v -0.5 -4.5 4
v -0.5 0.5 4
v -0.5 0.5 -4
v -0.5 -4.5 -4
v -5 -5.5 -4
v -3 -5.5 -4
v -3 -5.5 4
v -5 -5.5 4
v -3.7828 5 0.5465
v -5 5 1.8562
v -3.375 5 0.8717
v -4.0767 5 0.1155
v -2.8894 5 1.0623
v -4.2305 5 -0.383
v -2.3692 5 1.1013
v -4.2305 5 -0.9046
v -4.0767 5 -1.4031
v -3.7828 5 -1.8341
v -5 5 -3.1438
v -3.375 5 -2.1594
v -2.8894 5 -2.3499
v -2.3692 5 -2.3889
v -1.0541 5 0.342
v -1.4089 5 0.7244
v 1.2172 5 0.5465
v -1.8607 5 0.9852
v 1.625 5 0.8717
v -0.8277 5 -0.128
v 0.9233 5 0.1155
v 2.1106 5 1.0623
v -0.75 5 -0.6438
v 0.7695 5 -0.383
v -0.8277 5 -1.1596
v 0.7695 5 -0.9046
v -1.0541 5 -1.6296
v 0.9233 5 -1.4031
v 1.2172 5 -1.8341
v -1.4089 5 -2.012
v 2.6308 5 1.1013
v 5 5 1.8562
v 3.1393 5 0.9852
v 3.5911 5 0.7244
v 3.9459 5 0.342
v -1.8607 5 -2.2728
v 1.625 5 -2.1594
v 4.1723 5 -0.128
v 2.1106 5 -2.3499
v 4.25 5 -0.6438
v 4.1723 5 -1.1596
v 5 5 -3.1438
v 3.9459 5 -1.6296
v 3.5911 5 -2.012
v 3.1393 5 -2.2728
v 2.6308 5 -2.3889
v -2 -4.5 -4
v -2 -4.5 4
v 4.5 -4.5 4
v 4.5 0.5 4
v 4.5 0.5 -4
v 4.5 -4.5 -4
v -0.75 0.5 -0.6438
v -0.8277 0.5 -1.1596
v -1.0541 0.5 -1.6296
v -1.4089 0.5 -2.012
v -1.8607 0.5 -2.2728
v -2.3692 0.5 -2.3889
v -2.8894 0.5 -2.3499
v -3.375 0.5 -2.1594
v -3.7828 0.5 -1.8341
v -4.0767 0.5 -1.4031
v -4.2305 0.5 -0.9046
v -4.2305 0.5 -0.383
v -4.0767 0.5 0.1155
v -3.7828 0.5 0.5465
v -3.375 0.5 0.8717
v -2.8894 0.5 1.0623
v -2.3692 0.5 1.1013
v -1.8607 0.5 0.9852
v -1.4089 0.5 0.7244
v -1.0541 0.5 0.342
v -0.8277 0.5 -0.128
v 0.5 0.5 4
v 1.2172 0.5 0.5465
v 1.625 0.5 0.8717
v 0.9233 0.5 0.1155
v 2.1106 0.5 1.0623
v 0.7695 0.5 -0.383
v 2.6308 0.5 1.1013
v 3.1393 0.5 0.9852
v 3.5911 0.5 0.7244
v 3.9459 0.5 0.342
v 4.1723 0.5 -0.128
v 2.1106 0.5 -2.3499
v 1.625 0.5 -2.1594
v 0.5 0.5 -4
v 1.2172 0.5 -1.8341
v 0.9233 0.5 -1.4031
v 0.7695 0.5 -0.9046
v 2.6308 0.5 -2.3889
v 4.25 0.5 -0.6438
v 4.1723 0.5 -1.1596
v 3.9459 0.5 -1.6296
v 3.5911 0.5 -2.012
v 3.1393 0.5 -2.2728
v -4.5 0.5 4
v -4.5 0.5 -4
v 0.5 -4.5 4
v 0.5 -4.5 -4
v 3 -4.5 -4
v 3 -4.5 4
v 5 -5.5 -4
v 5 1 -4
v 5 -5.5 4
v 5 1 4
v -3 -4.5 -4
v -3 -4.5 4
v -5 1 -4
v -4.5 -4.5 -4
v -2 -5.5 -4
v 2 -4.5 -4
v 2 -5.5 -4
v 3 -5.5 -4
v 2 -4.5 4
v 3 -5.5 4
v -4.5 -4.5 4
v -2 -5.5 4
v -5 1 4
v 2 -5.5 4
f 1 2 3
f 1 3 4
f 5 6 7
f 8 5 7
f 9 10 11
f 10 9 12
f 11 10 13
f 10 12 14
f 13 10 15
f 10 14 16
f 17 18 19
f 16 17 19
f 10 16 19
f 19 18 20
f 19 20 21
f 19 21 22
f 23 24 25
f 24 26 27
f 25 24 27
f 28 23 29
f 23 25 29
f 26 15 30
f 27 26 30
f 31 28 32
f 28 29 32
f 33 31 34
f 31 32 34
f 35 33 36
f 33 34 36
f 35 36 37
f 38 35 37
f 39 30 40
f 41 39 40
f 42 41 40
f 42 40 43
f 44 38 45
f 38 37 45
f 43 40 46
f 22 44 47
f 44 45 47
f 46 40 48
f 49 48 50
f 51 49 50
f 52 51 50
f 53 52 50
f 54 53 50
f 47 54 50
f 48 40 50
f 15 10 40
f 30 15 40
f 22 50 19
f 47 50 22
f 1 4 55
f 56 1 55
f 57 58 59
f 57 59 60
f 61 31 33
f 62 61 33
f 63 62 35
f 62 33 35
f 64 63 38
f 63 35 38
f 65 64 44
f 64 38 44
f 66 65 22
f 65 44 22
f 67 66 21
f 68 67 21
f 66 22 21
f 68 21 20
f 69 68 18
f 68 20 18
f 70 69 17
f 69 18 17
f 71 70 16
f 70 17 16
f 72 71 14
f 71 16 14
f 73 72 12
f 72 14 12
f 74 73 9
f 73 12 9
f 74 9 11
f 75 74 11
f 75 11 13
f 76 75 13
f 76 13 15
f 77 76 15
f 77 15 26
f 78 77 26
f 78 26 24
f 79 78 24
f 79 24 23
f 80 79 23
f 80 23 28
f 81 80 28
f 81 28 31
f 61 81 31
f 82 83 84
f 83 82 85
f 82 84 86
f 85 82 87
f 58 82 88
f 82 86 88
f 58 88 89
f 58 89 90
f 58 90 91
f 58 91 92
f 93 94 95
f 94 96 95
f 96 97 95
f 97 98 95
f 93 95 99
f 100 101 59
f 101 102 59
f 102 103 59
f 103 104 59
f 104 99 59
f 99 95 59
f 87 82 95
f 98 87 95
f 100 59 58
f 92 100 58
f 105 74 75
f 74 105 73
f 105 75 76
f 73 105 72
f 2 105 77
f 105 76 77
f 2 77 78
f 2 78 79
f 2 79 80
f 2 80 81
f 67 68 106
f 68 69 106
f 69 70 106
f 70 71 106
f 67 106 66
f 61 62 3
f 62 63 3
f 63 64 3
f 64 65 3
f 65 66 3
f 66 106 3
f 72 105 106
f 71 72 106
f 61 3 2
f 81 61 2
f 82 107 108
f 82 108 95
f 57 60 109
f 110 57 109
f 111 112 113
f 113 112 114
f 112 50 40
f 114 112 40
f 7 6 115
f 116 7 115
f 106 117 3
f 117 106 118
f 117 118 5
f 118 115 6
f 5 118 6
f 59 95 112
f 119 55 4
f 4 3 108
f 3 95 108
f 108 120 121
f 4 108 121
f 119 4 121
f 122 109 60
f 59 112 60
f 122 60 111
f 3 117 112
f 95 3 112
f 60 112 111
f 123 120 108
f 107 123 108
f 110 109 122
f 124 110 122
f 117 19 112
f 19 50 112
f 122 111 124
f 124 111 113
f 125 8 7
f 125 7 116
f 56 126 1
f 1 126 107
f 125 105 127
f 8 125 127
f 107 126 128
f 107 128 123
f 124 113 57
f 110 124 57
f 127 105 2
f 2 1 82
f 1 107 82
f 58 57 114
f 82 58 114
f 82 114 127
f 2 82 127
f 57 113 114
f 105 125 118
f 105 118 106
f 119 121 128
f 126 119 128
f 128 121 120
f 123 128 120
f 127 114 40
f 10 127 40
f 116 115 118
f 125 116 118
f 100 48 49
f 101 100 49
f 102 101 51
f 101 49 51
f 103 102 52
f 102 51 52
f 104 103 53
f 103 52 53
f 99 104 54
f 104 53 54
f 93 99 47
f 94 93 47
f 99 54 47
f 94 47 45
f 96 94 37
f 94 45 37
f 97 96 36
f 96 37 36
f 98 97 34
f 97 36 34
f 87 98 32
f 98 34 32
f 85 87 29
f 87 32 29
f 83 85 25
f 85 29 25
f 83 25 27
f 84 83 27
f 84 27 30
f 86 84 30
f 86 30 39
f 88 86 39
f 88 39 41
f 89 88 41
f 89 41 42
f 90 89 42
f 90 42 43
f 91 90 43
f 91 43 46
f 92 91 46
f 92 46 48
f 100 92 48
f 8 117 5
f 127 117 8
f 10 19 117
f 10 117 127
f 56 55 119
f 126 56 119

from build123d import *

# Parameters (mm, degrees)
Y_KSEKLIK_EKSTR_ZYON1_DEPTH      = 5
Y_KSEKLIK_EKSTR_ZYON1_DEPTH_BACK = 5
KES_EKSTR_ZYON1_DEPTH            = 10
IZIM3_R                          = 1.75
KES_EKSTR_ZYON2_DEPTH            = 7


with BuildPart() as part:
    # izim1 → Y_kseklik-Ekstr_zyon1 (new body, two sides)
    with BuildSketch(Plane(origin=(0, 0, 0), x_dir=(0, 0, -1), z_dir=(1, 0, 0))) as y_kseklik_ekstr_zyon1_sk:
        Polygon((-1.856187291, 5), (3.143812709, 5), (4, 1), (4, -5.5), (-4, -5.5), (-4, 1), align=None)
    extrude(amount=Y_KSEKLIK_EKSTR_ZYON1_DEPTH)
    extrude(y_kseklik_ekstr_zyon1_sk.sketch, amount=-Y_KSEKLIK_EKSTR_ZYON1_DEPTH_BACK)

    # izim2 → Kes-Ekstr_zyon1 (cut)
    with BuildSketch(Plane(origin=(0, 0, -4), x_dir=(-1, 0, 0), z_dir=(0, 0, -1))):
        Polygon((-3, -4.5), (-3, -5.5), (-2, -5.5), (-2, -4.5), (-0.5, -4.5), (-0.5, 0.5), (-4.5, 0.5), (-4.5, -4.5), align=None)
        Polygon((2, -4.5), (2, -5.5), (3, -5.5), (3, -4.5), (4.5, -4.5), (4.5, 0.5), (0.5, 0.5), (0.5, -4.5), align=None)
    extrude(amount=-KES_EKSTR_ZYON1_DEPTH, mode=Mode.SUBTRACT)

    # izim3 → Kes-Ekstr_zyon2 (cut)
    with BuildSketch(Plane(origin=(0, 5, 0), x_dir=(1, 0, 0), z_dir=(0, 1, 0))):
        with Locations((-2.5, 0.643812709)):
            Circle(IZIM3_R)
        with Locations((2.5, 0.643812709)):
            Circle(IZIM3_R)
    extrude(amount=-KES_EKSTR_ZYON2_DEPTH, mode=Mode.SUBTRACT)


solid = part.part
